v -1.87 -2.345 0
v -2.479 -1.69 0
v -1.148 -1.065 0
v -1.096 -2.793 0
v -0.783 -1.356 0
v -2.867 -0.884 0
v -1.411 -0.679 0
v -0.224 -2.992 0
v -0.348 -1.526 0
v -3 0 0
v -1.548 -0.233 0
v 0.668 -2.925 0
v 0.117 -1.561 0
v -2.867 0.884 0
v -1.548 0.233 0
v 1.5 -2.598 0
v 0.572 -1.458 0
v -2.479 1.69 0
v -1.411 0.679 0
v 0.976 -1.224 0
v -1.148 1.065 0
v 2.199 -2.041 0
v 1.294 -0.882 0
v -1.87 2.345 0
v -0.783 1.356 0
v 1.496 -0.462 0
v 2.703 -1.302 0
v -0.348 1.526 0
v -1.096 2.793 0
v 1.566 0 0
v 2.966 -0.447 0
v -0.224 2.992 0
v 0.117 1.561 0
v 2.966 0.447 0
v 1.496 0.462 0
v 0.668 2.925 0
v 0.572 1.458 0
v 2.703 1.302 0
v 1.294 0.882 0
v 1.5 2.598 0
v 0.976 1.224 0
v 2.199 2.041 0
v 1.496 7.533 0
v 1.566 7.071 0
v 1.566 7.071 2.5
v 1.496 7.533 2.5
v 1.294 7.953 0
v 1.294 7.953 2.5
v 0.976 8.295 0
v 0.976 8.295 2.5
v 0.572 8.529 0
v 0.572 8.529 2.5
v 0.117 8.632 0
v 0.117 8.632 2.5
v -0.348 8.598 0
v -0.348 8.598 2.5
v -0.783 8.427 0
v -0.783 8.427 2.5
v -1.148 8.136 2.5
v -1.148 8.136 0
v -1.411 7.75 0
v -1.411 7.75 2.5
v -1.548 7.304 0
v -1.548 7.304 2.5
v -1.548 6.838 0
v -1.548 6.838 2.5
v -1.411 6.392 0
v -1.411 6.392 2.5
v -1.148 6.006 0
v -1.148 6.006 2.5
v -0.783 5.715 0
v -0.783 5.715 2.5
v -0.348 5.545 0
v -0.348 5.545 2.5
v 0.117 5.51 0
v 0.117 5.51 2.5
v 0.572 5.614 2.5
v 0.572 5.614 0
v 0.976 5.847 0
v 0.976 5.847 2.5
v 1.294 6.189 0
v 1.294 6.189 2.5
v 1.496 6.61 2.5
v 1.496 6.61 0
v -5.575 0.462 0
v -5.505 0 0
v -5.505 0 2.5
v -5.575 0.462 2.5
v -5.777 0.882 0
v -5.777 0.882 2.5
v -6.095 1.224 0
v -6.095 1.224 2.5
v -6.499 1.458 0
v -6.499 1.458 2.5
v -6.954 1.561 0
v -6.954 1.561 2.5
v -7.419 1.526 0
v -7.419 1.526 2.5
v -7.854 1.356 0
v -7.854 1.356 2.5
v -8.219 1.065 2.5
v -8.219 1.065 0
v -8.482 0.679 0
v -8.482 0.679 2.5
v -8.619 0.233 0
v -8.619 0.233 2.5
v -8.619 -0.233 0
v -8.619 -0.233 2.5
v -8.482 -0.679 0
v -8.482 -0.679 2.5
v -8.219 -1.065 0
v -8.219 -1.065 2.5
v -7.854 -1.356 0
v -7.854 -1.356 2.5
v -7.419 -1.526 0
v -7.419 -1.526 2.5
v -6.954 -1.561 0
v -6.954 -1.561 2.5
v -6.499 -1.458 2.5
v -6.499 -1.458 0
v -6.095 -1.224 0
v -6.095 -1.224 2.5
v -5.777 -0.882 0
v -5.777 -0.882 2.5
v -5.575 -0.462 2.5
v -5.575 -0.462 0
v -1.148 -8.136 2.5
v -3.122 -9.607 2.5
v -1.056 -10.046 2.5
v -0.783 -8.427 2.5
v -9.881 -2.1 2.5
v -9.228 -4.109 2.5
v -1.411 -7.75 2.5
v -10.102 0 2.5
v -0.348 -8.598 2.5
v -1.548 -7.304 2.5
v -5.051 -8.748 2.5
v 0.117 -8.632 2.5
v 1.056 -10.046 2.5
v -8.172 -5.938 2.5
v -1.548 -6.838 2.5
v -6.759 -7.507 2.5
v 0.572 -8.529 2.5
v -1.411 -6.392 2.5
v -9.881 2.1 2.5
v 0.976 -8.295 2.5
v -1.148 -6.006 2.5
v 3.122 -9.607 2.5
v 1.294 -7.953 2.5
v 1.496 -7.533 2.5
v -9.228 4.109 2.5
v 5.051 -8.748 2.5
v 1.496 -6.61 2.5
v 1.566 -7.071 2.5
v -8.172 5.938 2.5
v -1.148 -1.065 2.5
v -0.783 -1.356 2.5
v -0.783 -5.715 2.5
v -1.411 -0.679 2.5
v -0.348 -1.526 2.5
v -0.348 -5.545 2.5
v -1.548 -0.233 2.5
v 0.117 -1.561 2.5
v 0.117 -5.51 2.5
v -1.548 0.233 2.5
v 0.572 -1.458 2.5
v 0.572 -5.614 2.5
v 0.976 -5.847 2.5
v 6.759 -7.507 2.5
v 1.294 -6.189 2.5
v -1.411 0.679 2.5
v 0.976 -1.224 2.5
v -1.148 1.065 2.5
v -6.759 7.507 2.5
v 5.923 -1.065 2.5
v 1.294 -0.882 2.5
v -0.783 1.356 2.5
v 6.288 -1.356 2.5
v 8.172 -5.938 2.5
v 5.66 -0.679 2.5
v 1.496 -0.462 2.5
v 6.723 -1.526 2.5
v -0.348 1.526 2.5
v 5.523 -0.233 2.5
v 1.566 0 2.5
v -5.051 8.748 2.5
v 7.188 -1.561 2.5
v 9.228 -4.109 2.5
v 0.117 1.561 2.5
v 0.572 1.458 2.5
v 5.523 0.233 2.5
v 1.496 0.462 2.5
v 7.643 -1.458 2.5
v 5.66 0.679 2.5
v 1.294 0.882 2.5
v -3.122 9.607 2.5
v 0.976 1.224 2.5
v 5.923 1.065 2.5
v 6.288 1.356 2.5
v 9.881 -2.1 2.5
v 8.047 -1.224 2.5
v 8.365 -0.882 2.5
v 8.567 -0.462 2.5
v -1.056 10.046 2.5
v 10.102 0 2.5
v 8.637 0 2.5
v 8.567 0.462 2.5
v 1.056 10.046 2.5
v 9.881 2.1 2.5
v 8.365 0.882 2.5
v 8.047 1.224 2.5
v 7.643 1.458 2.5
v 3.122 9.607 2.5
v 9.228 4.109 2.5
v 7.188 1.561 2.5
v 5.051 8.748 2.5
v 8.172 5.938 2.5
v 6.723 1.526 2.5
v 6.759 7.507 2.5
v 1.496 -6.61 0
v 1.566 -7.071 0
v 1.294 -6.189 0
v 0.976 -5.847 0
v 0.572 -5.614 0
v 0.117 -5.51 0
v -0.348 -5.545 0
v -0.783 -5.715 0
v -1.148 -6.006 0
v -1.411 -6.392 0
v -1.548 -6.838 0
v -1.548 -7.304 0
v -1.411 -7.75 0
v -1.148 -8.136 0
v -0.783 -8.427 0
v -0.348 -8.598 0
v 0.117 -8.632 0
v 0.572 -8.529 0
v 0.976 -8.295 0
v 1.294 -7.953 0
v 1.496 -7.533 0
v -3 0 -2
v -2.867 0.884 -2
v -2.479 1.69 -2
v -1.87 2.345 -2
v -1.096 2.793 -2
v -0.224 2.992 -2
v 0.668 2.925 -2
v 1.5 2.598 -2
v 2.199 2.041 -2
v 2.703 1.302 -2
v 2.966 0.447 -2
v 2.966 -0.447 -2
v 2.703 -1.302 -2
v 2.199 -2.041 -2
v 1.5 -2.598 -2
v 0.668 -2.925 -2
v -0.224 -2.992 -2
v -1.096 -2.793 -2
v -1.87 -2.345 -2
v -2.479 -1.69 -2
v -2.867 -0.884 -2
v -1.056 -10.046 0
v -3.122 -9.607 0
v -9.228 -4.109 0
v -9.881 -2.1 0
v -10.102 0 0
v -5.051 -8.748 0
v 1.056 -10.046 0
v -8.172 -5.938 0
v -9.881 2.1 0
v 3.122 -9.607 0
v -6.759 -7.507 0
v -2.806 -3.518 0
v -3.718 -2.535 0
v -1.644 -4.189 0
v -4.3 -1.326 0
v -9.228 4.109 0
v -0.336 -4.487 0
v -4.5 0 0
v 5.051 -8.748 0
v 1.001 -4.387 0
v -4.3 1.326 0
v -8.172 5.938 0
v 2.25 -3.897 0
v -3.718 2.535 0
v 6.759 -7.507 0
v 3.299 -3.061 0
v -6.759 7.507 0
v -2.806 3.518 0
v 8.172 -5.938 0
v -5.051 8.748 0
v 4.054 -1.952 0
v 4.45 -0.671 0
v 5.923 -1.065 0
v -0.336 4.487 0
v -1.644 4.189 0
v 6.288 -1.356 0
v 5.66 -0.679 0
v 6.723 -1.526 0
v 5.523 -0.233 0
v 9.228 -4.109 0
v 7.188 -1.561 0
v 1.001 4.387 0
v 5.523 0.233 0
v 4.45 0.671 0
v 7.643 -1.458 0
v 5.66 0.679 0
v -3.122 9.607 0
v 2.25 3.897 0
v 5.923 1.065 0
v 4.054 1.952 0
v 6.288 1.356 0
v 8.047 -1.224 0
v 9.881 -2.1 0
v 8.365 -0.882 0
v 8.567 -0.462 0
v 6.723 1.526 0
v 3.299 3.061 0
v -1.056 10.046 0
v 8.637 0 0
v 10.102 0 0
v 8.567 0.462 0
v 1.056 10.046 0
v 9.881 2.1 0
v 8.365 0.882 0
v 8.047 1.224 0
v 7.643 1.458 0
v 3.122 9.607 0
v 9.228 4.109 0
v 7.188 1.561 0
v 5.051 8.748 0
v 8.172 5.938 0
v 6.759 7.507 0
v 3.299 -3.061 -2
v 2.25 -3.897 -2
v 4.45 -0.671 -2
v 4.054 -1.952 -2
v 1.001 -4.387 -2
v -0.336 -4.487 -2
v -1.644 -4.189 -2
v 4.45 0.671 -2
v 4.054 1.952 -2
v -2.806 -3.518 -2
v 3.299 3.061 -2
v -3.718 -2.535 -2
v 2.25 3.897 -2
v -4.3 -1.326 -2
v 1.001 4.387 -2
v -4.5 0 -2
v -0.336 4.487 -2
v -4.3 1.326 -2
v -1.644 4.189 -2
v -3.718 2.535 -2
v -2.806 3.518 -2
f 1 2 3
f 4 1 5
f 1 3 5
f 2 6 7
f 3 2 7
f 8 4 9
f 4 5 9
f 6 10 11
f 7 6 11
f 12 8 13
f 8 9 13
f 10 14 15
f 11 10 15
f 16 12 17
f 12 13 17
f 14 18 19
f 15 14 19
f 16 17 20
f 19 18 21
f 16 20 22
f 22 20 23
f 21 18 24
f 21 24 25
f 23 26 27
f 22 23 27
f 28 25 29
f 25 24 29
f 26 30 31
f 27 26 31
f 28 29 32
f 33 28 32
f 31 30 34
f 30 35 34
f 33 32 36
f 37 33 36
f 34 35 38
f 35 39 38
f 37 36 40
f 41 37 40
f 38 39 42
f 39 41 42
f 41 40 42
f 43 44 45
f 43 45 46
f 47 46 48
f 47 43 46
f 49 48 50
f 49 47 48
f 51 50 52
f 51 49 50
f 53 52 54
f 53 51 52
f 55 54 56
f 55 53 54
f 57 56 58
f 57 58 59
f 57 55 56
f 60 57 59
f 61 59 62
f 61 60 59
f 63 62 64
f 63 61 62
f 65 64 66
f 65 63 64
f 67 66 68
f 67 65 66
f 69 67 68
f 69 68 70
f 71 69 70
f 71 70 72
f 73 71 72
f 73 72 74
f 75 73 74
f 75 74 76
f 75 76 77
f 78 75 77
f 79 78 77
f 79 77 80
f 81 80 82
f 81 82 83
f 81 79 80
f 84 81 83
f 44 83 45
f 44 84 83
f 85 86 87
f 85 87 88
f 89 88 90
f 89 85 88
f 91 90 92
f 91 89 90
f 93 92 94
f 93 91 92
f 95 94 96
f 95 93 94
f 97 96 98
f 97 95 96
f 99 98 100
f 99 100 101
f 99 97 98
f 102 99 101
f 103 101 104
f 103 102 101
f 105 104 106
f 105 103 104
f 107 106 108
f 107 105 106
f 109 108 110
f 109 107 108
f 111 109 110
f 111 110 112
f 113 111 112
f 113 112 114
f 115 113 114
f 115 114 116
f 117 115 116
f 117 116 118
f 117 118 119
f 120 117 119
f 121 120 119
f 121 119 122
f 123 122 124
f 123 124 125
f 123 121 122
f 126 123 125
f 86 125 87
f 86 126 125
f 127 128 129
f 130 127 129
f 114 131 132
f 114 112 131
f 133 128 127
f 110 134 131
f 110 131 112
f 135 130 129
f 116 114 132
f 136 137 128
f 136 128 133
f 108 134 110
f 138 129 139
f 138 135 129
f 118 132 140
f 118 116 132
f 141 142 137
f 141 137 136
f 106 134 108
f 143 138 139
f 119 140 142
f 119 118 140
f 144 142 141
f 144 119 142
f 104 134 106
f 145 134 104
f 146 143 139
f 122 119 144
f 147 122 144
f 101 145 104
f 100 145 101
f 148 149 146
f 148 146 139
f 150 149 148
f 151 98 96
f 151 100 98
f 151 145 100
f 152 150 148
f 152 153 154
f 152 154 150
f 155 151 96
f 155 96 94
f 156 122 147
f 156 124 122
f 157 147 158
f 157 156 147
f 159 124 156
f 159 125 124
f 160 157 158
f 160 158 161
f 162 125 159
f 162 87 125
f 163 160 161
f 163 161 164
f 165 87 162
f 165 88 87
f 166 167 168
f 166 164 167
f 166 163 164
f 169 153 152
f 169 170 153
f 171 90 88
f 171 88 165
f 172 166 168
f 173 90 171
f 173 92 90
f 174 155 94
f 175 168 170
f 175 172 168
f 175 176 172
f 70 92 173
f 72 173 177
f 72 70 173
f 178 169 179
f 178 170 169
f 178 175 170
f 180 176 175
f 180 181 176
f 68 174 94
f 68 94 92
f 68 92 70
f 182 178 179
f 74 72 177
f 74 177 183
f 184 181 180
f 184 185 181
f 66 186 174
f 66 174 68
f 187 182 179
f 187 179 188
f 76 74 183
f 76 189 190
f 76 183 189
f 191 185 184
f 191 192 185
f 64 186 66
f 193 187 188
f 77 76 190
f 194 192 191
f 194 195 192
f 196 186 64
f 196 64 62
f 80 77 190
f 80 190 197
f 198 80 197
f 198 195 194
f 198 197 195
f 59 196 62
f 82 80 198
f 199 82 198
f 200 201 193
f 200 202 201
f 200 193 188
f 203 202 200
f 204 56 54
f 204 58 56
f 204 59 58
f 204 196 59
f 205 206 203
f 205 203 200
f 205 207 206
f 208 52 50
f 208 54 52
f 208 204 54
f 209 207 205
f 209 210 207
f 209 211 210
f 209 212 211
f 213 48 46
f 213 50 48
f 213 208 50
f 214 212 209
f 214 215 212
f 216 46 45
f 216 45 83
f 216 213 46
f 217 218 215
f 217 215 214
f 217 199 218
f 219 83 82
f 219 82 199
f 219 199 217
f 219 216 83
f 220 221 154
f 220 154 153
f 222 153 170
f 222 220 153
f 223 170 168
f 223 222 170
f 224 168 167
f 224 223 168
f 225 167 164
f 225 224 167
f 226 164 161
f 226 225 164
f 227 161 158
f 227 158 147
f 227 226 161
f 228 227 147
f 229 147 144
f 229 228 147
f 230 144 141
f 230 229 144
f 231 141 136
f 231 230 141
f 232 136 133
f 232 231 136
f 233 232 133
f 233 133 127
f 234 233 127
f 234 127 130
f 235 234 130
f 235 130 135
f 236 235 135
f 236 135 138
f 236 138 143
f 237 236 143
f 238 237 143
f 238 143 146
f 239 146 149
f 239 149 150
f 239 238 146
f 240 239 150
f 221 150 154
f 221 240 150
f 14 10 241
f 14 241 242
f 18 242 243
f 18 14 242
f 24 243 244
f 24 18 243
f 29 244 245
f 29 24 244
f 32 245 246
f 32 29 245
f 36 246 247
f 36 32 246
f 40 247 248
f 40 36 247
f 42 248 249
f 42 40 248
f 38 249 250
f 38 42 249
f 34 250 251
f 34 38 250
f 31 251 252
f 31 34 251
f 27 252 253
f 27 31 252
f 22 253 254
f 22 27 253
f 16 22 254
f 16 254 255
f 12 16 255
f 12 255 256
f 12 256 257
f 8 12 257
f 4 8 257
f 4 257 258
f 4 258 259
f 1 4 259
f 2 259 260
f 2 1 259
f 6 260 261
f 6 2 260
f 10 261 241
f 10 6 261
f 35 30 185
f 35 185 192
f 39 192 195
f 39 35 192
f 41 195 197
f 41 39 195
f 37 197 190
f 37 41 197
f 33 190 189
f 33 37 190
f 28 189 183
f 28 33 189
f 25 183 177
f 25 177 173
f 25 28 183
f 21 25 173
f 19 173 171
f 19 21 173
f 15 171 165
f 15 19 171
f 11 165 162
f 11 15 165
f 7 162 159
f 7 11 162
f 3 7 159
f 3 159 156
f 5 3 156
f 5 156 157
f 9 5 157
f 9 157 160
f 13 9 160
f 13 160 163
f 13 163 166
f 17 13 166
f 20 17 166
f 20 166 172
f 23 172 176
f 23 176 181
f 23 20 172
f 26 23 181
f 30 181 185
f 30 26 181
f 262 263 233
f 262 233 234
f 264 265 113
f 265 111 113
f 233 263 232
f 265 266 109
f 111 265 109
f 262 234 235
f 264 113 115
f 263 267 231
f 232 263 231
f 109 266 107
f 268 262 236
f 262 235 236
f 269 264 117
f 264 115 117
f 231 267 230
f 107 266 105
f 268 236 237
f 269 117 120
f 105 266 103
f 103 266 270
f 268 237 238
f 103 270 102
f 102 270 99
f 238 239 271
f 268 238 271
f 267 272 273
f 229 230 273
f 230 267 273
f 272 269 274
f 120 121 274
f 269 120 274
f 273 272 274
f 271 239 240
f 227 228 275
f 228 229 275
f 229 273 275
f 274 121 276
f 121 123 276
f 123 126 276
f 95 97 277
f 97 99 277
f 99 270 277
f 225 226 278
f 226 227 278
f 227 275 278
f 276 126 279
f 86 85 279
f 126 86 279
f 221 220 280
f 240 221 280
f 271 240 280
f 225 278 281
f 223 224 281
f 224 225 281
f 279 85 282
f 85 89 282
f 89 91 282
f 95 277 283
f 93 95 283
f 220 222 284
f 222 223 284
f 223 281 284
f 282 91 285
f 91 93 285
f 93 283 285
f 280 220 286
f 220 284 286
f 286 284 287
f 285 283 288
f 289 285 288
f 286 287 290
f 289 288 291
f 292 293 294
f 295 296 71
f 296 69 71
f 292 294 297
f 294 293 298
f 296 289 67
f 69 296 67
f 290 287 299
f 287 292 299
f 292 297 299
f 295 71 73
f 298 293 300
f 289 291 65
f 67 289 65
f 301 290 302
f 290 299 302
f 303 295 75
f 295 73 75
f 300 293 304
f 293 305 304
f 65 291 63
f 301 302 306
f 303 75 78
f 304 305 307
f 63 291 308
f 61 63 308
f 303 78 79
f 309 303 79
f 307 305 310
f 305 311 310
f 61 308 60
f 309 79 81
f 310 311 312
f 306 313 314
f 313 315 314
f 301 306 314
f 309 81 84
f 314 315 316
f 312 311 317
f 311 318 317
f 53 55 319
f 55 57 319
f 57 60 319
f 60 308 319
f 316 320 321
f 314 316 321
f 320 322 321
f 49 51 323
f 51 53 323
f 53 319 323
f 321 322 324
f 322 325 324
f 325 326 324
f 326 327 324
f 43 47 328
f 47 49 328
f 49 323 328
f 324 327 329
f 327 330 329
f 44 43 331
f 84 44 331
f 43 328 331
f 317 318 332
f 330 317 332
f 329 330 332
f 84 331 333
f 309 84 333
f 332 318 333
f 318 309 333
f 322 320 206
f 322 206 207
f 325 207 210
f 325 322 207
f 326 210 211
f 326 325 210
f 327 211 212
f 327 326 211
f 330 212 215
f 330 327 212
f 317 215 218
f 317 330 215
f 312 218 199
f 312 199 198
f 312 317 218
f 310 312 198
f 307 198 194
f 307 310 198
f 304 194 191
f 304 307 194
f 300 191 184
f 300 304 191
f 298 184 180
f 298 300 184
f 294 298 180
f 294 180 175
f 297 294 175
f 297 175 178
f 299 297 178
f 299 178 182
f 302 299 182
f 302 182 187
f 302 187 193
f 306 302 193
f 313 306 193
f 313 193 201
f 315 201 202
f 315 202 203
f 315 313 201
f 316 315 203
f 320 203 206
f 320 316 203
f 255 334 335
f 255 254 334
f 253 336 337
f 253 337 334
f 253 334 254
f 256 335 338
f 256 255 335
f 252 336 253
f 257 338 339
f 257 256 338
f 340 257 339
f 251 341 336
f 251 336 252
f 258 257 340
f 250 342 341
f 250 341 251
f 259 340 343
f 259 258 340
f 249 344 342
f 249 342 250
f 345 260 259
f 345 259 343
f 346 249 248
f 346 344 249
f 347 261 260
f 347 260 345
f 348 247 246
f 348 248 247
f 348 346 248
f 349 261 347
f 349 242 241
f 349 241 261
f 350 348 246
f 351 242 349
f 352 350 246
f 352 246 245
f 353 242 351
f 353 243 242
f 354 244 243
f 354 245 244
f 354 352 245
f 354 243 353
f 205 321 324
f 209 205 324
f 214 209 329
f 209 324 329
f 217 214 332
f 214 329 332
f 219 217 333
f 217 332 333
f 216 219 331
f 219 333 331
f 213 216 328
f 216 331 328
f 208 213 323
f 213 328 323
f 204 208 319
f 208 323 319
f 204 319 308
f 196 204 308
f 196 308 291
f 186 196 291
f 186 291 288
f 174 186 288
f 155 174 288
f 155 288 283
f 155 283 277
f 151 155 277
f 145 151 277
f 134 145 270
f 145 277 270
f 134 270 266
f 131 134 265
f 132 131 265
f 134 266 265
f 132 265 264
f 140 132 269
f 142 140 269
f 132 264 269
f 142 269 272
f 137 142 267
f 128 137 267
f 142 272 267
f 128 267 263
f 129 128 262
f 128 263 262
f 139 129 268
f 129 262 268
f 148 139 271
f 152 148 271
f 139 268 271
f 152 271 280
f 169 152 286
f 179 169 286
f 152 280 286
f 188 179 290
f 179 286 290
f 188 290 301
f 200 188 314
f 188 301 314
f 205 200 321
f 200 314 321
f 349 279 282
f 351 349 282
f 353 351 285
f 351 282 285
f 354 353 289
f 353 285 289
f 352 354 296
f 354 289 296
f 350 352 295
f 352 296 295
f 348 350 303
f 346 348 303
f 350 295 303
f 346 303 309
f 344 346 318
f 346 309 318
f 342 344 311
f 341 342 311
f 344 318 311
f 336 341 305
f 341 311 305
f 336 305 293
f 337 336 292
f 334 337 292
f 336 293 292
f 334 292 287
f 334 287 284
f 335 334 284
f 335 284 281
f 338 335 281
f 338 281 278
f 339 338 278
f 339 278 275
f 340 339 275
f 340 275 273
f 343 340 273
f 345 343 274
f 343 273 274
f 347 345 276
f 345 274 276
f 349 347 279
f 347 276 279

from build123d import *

# Parameters (mm, degrees)
SKETCH_1_R      = 10.101525446
SKETCH_1_R_2    = 1.565736444
EXTRUDE_1_DEPTH = 2.5
SKETCH_2_R      = 4.5
SKETCH_2_R_2    = 3
EXTRUDE_2_DEPTH = 2


with BuildPart() as part:
    # 草图1 → 凸台-拉伸1 (new body)
    with BuildSketch(Plane.XY):
        Circle(SKETCH_1_R)
        Circle(SKETCH_1_R_2, mode=Mode.SUBTRACT)
        with Locations((7.071067812, 0)):
            Circle(SKETCH_1_R_2, mode=Mode.SUBTRACT)
        with Locations((-7.071067812, 0)):
            Circle(SKETCH_1_R_2, mode=Mode.SUBTRACT)
        with Locations((0, 7.071067812)):
            Circle(SKETCH_1_R_2, mode=Mode.SUBTRACT)
        with Locations((0, -7.071067812)):
            Circle(SKETCH_1_R_2, mode=Mode.SUBTRACT)
    extrude(amount=EXTRUDE_1_DEPTH)

    # 草图2 → 凸台-拉伸2 (add)
    with BuildSketch(Plane(origin=(0, 0, 0), x_dir=(-1, 0, 0), z_dir=(0, 0, -1))):
        Circle(SKETCH_2_R)
        Circle(SKETCH_2_R_2, mode=Mode.SUBTRACT)
    extrude(amount=EXTRUDE_2_DEPTH)


solid = part.part
